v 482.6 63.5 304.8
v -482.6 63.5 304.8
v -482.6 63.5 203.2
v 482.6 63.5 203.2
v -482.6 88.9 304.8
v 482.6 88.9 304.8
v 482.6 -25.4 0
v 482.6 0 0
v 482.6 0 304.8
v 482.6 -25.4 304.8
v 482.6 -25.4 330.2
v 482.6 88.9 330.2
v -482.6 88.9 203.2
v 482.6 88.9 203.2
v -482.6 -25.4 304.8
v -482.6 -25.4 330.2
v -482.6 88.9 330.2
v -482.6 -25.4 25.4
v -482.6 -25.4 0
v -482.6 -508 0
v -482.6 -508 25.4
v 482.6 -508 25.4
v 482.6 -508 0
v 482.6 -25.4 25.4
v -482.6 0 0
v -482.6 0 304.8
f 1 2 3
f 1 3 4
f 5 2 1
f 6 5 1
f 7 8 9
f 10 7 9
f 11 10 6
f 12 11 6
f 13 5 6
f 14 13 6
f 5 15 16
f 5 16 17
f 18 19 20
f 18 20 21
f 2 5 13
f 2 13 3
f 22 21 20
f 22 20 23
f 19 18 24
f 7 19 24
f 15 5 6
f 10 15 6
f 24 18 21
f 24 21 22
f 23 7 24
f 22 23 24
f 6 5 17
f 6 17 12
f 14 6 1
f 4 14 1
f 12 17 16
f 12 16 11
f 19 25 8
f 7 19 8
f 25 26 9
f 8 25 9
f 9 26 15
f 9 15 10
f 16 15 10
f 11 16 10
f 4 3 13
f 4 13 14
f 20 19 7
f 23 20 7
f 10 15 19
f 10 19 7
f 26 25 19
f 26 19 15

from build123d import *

# Parameters (mm, degrees)
F0_W     = 965.2
F0_H     = 304.8
F1_DEPTH = 25.4
F2_W     = 965.2
F2_H     = 25.4
F3_DEPTH = 482.6
F4_W     = 965.2
F4_H     = 114.3
F5_DEPTH = 25.4
F6_W     = 965.2
F6_H     = 25.4
F7_DEPTH = 101.6


with BuildPart() as f1:
    # F0 (on Front) → F1 (new body)
    with BuildSketch(Plane.XZ):
        with Locations((0, 152.4)):
            Rectangle(F0_W, F0_H)
    extrude(amount=F1_DEPTH)


with BuildPart() as f3:
    # F2 (on face) → F3 (new body)
    with BuildSketch(Plane.XZ.offset(25.4)):
        with Locations((0, 12.7)):
            Rectangle(F2_W, F2_H)
    extrude(amount=F3_DEPTH)


with BuildPart() as f5:
    # F4 (on face) → F5 (new body)
    with BuildSketch(Plane.XY.offset(304.8)):
        with Locations((0, 31.75)):
            Rectangle(F4_W, F4_H)
    extrude(amount=F5_DEPTH)


with BuildPart() as f7:
    # F6 (on face) → F7 (new body)
    with BuildSketch(Plane(origin=(0, 0, 304.8), x_dir=(1, 0, 0), z_dir=(0, 0, -1))):
        with Locations((0, -76.2)):
            Rectangle(F6_W, F6_H)
    extrude(amount=F7_DEPTH)


solid = Compound([f1.part, f3.part, f5.part, f7.part])
